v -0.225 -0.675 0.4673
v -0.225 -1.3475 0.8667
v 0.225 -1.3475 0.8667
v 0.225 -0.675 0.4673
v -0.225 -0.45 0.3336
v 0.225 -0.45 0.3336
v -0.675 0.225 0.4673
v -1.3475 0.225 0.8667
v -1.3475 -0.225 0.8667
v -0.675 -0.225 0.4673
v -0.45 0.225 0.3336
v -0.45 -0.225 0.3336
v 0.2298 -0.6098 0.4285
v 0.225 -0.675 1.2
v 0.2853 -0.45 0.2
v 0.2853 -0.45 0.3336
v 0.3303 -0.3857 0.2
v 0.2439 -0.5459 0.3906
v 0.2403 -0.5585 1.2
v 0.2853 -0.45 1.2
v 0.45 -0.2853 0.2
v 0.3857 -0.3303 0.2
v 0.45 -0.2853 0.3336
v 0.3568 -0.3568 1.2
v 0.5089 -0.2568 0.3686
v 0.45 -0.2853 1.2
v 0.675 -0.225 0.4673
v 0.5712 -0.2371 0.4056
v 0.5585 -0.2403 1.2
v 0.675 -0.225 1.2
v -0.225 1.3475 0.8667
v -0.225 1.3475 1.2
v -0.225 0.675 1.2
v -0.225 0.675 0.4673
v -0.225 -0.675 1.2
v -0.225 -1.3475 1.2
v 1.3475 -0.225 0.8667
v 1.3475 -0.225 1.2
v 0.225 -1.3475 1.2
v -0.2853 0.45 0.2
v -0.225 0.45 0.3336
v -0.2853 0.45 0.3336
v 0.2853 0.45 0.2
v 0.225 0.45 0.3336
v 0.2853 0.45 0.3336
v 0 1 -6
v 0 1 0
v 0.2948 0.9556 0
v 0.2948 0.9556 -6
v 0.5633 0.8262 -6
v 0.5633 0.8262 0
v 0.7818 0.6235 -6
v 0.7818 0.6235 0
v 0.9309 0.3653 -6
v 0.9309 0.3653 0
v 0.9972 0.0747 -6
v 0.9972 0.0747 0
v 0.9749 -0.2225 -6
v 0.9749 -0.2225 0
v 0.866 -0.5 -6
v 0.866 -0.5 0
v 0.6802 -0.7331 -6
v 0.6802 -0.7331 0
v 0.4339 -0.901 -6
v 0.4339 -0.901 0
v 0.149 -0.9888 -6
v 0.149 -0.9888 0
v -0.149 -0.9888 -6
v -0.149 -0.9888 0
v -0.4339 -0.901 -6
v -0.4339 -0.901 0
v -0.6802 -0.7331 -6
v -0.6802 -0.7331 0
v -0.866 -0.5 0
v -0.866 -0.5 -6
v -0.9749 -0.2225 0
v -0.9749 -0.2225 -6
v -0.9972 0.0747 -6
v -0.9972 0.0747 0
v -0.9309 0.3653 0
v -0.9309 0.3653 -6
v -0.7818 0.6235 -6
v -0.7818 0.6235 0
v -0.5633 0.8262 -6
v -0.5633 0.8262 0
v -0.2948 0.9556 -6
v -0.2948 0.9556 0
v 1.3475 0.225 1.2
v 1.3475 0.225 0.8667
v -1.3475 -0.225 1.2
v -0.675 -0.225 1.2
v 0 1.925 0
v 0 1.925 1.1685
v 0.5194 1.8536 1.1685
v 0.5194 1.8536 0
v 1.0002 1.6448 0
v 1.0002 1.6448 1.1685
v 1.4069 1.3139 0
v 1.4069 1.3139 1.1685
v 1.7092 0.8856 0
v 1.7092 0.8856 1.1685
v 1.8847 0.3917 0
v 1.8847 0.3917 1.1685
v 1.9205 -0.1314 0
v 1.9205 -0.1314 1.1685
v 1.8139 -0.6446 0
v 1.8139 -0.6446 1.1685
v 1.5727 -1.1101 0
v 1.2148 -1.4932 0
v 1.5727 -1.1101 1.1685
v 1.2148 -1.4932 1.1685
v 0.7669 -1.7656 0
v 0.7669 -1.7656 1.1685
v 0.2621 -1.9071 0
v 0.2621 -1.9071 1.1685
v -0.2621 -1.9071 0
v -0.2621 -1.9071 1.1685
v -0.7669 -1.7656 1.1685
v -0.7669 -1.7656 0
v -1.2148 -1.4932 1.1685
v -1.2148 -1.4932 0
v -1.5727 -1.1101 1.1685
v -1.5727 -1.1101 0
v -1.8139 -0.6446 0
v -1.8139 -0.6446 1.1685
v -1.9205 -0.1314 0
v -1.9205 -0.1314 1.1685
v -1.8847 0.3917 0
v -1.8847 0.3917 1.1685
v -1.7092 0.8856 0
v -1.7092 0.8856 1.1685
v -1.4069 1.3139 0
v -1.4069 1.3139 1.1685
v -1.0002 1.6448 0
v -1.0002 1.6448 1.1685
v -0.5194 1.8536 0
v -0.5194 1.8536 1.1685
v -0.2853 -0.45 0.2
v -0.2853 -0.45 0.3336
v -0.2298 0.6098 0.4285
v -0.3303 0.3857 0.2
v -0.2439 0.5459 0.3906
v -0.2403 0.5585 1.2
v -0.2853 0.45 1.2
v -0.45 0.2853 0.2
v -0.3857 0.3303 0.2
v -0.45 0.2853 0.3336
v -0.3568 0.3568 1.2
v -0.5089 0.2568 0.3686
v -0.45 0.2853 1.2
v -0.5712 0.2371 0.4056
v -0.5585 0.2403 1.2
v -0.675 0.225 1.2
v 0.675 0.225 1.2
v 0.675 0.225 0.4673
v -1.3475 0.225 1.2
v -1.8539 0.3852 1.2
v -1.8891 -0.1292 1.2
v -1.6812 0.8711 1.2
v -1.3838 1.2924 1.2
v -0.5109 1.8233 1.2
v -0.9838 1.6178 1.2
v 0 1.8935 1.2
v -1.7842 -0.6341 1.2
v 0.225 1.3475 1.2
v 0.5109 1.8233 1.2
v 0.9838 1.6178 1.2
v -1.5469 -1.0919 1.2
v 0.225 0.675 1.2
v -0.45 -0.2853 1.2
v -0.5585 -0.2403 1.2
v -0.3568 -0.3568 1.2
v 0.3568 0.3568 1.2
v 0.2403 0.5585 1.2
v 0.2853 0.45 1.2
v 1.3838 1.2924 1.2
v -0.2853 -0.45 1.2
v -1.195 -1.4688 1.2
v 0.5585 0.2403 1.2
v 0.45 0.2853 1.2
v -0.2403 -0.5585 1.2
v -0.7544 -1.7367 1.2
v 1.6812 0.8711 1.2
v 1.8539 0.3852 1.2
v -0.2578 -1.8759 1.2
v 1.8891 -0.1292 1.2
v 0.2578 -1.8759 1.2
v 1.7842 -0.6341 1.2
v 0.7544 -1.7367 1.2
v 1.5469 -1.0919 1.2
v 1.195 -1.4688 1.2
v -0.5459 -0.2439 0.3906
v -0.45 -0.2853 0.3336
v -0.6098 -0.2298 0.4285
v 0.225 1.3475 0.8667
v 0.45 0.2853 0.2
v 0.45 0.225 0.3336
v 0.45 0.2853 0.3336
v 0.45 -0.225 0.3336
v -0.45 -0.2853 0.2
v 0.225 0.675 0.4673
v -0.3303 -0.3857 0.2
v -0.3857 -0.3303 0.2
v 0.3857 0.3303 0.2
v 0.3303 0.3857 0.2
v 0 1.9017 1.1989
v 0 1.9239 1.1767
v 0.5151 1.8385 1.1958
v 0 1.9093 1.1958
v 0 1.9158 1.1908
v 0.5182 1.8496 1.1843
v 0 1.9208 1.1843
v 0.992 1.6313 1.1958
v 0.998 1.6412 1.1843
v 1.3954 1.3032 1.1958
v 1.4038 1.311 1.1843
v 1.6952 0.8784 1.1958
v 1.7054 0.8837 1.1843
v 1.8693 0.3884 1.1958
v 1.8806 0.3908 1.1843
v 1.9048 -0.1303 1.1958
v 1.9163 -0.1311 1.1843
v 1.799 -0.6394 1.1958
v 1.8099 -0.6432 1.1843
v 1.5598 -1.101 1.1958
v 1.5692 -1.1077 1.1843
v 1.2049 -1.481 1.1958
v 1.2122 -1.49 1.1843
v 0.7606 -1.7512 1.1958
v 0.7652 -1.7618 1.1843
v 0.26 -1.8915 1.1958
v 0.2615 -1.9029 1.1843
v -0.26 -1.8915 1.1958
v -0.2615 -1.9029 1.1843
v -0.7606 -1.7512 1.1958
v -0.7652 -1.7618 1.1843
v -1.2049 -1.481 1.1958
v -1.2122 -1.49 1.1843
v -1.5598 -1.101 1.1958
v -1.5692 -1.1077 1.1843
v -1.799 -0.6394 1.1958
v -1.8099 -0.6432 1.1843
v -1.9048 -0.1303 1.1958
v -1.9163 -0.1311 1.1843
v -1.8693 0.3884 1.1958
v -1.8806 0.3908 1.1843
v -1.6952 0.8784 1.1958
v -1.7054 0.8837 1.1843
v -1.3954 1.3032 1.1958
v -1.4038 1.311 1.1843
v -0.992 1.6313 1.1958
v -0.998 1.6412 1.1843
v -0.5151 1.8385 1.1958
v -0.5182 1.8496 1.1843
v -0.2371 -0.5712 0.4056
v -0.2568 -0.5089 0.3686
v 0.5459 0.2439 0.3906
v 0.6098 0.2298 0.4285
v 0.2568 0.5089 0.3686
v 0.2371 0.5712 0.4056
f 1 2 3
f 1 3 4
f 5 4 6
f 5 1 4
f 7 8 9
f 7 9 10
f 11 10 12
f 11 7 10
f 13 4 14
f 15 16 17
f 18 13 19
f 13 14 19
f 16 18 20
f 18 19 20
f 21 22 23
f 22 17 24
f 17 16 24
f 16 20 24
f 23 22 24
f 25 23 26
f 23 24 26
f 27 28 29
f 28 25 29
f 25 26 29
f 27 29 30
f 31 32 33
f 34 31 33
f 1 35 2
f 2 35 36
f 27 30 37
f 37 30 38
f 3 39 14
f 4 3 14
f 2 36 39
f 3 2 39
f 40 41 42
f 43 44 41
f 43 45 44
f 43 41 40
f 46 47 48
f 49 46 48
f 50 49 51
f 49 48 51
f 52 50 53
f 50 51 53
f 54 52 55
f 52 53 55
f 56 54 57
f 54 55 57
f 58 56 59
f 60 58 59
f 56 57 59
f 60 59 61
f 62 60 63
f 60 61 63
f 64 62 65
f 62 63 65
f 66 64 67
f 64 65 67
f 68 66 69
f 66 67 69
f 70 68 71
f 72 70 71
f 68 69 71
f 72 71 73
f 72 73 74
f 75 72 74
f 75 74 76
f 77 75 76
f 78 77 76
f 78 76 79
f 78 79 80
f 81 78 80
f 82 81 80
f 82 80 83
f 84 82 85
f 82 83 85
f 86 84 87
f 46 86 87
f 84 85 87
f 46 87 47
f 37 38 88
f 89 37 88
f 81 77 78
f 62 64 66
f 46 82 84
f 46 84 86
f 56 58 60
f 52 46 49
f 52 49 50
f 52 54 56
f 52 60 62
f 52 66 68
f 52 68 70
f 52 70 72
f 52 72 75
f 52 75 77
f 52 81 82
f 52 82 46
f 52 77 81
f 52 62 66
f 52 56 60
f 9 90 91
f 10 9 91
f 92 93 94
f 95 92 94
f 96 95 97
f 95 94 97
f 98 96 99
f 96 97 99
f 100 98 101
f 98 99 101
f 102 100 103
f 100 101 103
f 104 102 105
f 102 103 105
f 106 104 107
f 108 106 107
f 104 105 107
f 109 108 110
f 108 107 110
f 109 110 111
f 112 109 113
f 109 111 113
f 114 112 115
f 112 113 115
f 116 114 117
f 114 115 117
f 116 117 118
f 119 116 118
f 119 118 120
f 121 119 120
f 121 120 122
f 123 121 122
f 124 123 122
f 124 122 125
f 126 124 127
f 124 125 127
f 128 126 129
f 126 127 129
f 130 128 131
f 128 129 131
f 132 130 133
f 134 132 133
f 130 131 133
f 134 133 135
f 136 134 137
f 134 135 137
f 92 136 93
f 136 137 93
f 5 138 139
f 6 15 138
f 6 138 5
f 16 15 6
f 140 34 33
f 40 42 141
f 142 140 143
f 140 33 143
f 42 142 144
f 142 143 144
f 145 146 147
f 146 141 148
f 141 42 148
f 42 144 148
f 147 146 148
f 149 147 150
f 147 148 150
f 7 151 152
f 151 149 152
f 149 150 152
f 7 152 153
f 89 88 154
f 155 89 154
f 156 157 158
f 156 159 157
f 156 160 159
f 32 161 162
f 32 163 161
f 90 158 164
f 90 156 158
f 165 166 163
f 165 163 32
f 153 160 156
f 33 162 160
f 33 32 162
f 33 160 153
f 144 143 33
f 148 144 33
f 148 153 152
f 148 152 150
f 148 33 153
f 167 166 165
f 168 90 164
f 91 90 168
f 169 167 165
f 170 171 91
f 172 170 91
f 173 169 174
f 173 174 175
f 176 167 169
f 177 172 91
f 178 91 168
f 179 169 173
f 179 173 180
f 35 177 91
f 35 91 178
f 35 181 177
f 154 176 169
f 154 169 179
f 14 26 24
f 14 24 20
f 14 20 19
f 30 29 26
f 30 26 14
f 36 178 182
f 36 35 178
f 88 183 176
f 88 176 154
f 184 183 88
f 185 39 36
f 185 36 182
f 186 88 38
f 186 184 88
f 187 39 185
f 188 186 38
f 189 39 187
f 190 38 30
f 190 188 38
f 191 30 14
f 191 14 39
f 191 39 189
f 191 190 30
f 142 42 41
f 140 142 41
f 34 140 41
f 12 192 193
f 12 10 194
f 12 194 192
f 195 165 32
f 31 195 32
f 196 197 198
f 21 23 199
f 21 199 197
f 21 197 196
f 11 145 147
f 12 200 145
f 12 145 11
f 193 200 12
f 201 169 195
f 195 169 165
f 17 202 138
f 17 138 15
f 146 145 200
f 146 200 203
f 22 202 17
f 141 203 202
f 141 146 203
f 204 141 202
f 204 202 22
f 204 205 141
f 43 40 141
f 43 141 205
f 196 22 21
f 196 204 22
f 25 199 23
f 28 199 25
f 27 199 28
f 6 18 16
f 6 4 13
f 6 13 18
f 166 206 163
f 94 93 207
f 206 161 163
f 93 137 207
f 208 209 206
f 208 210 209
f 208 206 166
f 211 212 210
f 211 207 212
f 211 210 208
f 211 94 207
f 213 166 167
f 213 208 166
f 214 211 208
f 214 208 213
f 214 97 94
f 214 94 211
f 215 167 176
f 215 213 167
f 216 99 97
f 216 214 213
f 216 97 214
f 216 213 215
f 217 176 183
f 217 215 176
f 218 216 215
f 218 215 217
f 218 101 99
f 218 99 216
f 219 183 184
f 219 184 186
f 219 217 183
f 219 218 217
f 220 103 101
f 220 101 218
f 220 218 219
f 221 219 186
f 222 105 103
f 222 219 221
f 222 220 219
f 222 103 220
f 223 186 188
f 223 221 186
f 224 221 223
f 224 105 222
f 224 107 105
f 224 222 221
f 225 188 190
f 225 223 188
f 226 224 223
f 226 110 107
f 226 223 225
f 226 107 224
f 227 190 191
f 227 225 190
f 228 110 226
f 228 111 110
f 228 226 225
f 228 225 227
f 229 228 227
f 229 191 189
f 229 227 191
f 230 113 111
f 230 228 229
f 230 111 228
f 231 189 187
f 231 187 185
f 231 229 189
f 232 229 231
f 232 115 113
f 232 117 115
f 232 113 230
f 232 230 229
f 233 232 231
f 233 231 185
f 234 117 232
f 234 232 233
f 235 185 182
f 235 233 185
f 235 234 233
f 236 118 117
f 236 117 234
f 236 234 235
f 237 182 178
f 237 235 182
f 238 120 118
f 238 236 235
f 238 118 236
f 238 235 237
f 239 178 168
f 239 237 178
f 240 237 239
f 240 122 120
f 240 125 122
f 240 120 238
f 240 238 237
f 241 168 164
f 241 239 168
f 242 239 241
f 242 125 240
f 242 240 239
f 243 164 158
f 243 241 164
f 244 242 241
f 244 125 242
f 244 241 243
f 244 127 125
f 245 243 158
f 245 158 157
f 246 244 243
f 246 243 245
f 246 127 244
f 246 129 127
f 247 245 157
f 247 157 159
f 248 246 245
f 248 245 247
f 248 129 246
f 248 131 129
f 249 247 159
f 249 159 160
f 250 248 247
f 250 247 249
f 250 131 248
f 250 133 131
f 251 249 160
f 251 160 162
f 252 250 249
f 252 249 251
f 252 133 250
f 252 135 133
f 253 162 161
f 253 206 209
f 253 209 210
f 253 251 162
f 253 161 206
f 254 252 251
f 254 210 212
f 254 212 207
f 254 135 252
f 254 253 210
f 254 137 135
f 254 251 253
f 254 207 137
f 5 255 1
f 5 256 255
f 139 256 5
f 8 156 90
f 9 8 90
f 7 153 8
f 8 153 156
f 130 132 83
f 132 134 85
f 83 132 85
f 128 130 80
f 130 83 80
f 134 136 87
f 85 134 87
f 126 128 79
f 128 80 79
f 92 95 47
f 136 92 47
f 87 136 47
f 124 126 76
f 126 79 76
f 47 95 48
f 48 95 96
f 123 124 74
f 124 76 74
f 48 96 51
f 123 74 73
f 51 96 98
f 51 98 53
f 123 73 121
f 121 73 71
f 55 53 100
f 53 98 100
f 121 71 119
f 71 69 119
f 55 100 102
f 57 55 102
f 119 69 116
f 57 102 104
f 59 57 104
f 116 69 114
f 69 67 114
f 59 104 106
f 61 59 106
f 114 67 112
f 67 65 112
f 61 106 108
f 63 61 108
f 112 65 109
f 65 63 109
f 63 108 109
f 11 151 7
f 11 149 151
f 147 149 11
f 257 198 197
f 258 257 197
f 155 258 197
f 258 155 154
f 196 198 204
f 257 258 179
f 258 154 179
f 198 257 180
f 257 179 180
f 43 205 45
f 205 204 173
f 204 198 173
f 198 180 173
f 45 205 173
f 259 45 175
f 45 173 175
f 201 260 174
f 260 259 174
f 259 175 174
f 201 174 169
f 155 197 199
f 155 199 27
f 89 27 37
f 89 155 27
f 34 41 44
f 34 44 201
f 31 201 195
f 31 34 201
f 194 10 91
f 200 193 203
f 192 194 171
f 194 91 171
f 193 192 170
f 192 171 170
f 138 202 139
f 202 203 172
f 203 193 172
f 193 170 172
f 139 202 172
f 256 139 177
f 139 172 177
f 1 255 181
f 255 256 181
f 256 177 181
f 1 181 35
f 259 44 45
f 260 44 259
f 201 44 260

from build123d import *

# Parameters (mm, degrees)
SKETCH_1_W          = 1.925
SKETCH_1_H          = 1.2
CUT_EXTRUDE_1_DEPTH = 1
SKETCH_3_W          = 0.8975
SKETCH_3_H          = 0.13363029
EXTRUDE_1_DEPTH     = 0.45
SKETCH_4_W          = 0.13363029
SKETCH_4_H          = 0.8975
EXTRUDE_2_DEPTH     = 0.45
SKETCH_5_W          = 0.8975
SKETCH_5_H          = 0.13363029
EXTRUDE_3_DEPTH     = 0.45
SKETCH_6_W          = 0.13363029
SKETCH_6_H          = 0.8975
EXTRUDE_4_DEPTH     = 0.45
SKETCH_7_R          = 1
EXTRUDE_5_DEPTH     = 6
DRAFT_1_ANGLE       = 30.706601503
DRAFT_2_ANGLE       = 30.706601503
DRAFT_3_ANGLE       = 30.706601503
DRAFT_4_ANGLE       = 30.706601503
FILLET_1_R          = 0.031496063
FILLET_2_R          = 0.45


with BuildPart() as part:
    # 草图1 → 旋转1 (revolve)
    with BuildSketch(Plane.XZ, mode=Mode.PRIVATE) as revolve_1_sk:
        with Locations((0.9625, 0.6)):
            Rectangle(SKETCH_1_W, SKETCH_1_H)
    revolve(revolve_1_sk.sketch.rotate(Axis((0, 0, 1.2), (0, 0, -1)), 270), axis=Axis((0, 0, 1.2), (0, 0, -1)))

    # 草图2 → 切除-拉伸1 (cut)
    with BuildSketch(Plane.XY.offset(1.2)):
        Polygon((0.225, 1.3475), (-0.225, 1.3475), (-0.225, 0.225), (-1.3475, 0.225), (-1.3475, -0.225), (-0.225, -0.225), (-0.225, -1.3475), (0.225, -1.3475), (0.225, -0.225), (1.3475, -0.225), (1.3475, 0.225), (0.225, 0.225), align=None)
    extrude(amount=-CUT_EXTRUDE_1_DEPTH, mode=Mode.SUBTRACT)

    # 草图3 → 凸台-拉伸1 (add)
    with BuildSketch(Plane.XZ.offset(-0.225)):
        with Locations((-0.89875, 0.266815145)):
            Rectangle(SKETCH_3_W, SKETCH_3_H)
    extrude(amount=EXTRUDE_1_DEPTH)

    # 草图4 → 凸台-拉伸2 (add)
    with BuildSketch(Plane(origin=(-0.225, 0, 0), x_dir=(0, 0, -1), z_dir=(1, 0, 0))):
        with Locations((-0.266815145, 0.89875)):
            Rectangle(SKETCH_4_W, SKETCH_4_H)
    extrude(amount=EXTRUDE_2_DEPTH)

    # 草图5 → 凸台-拉伸3 (add)
    with BuildSketch(Plane.XZ.offset(-0.225)):
        with Locations((0.89875, 0.266815145)):
            Rectangle(SKETCH_5_W, SKETCH_5_H)
    extrude(amount=EXTRUDE_3_DEPTH)

    # 草图6 → 凸台-拉伸4 (add)
    with BuildSketch(Plane(origin=(-0.225, 0, 0), x_dir=(0, 0, -1), z_dir=(1, 0, 0))):
        with Locations((-0.266815145, -0.89875)):
            Rectangle(SKETCH_6_W, SKETCH_6_H)
    extrude(amount=EXTRUDE_4_DEPTH)

    # 草图7 → 凸台-拉伸5 (add)
    with BuildSketch(Plane(origin=(0, 0, 0), x_dir=(-1, 0, 0), z_dir=(0, 0, -1))):
        with Locations(Location((0, 0, 0), (0, 0, 90))):
            Circle(SKETCH_7_R)
    extrude(amount=EXTRUDE_5_DEPTH)

    # 拔模1
    draft_1_faces = [part.faces().sort_by_distance(p)[0] for p in [
        (0, 0.89875, 0.33363029),
    ]]
    draft(draft_1_faces, Plane(origin=(0.225, 0.45, 0.2), x_dir=(0, 0, -1), z_dir=(0, -1, 0)), DRAFT_1_ANGLE)

    # 拔模2
    draft_2_faces = [part.faces().sort_by_distance(p)[0] for p in [
        (0.89875, 0, 0.33363029),
    ]]
    draft(draft_2_faces, Plane(origin=(0.45, -0.225, 0.2), x_dir=(0, 0, -1), z_dir=(-1, 0, 0)), DRAFT_2_ANGLE)

    # 拔模3
    draft_3_faces = [part.faces().sort_by_distance(p)[0] for p in [
        (0, -0.89875, 0.33363029),
    ]]
    draft(draft_3_faces, Plane(origin=(0.225, -0.45, 0.33363029), x_dir=(0, 0, 1), z_dir=(0, 1, 0)), DRAFT_3_ANGLE)

    # 拔模4
    draft_4_faces = [part.faces().sort_by_distance(p)[0] for p in [
        (-0.89875, 0, 0.33363029),
    ]]
    draft(draft_4_faces, Plane(origin=(-0.45, -0.225, 0.33363029), x_dir=(0, 0, 1), z_dir=(1, 0, 0)), DRAFT_4_ANGLE)

    # 圆角1
    fillet_1_edges = [part.edges().sort_by_distance(p)[0] for p in [
        (0, -1.925, 1.2),
    ]]
    fillet(fillet_1_edges, radius=FILLET_1_R)

    # 圆角2
    # the kernel refuses this fillet: 0.45 mm, written as the material it takes off along each edge
    with BuildSketch(Plane(origin=(0.225, 0.225, 2.325), x_dir=(0, 1, 0), z_dir=(0, 0, -1))) as fillet_2_piece_1_section:
        with BuildLine():
            CenterArc((FILLET_2_R, FILLET_2_R), FILLET_2_R, 180, 90)
            Line((0, FILLET_2_R), (0, 0))
            Line((0, 0), (FILLET_2_R, 0))
        make_face()
    fillet_2_piece_1 = extrude(amount=3.25, mode=Mode.PRIVATE)
    fillet_2_piece_1 = split(fillet_2_piece_1, bisect_by=Plane(origin=(0.243098692, 0.68726219, 0.474543246), z_dir=(0, -0.5106419849565733, 0.8597934421706244)), keep=Keep.TOP, mode=Mode.PRIVATE)
    fillet_2_piece_1 = split(fillet_2_piece_1, bisect_by=Plane(origin=(0.45, 0.504131357, 0.782889786), z_dir=(-1, 0, 0)), keep=Keep.TOP, mode=Mode.PRIVATE)
    add(fillet_2_piece_1, mode=Mode.SUBTRACT)
    with BuildSketch(Plane(origin=(0.225, 0.225, 2.325), x_dir=(0, 1, 0), z_dir=(0, 0, -1))) as fillet_2_piece_2_section:
        with BuildLine():
            CenterArc((FILLET_2_R, FILLET_2_R), FILLET_2_R, 180, 90)
            Line((0, FILLET_2_R), (0, 0))
            Line((0, 0), (FILLET_2_R, 0))
        make_face()
    fillet_2_piece_2 = extrude(amount=3.25, mode=Mode.PRIVATE)
    fillet_2_piece_2 = split(fillet_2_piece_2, bisect_by=Plane(origin=(0.504131356, 0.45, 0.782889786), z_dir=(0, -1, 0)), keep=Keep.TOP, mode=Mode.PRIVATE)
    fillet_2_piece_2 = split(fillet_2_piece_2, bisect_by=Plane(origin=(0.68726219, 0.243098692, 0.474543246), z_dir=(-0.5106419849565748, 0, 0.8597934421706236)), keep=Keep.TOP, mode=Mode.PRIVATE)
    add(fillet_2_piece_2, mode=Mode.SUBTRACT)
    with BuildSketch(Plane(origin=(0.225, 0.225, 2.325), x_dir=(0, 1, 0), z_dir=(0, 0, -1))) as fillet_2_piece_3_section:
        with BuildLine():
            CenterArc((FILLET_2_R, FILLET_2_R), FILLET_2_R, 180, 90)
            Line((0, FILLET_2_R), (0, 0))
            Line((0, 0), (FILLET_2_R, 0))
        make_face()
    fillet_2_piece_3 = extrude(amount=2.125, mode=Mode.PRIVATE)
    fillet_2_piece_3 = split(fillet_2_piece_3, bisect_by=Plane(origin=(0.325721218, 0.45, 0.219864503), z_dir=(0, -1, 0)), keep=Keep.TOP, mode=Mode.PRIVATE)
    fillet_2_piece_3 = split(fillet_2_piece_3, bisect_by=Plane(origin=(0.45, 0.325721218, 0.219864503), z_dir=(-1, 0, 0)), keep=Keep.TOP, mode=Mode.PRIVATE)
    add(fillet_2_piece_3, mode=Mode.SUBTRACT)
    with BuildSketch(Plane(origin=(0.225, -0.225, 2.325), x_dir=(1, 0, 0), z_dir=(0, 0, -1))) as fillet_2_piece_4_section:
        with BuildLine():
            CenterArc((FILLET_2_R, FILLET_2_R), FILLET_2_R, 180, 90)
            Line((0, FILLET_2_R), (0, 0))
            Line((0, 0), (FILLET_2_R, 0))
        make_face()
    fillet_2_piece_4 = extrude(amount=3.25, mode=Mode.PRIVATE)
    fillet_2_piece_4 = split(fillet_2_piece_4, bisect_by=Plane(origin=(0.68726219, -0.243098692, 0.474543246), z_dir=(-0.5106419849565748, 0, 0.8597934421706236)), keep=Keep.TOP, mode=Mode.PRIVATE)
    fillet_2_piece_4 = split(fillet_2_piece_4, bisect_by=Plane(origin=(0.504131357, -0.45, 0.782889786), z_dir=(0, 1, 0)), keep=Keep.TOP, mode=Mode.PRIVATE)
    add(fillet_2_piece_4, mode=Mode.SUBTRACT)
    with BuildSketch(Plane(origin=(0.225, -0.225, 2.325), x_dir=(1, 0, 0), z_dir=(0, 0, -1))) as fillet_2_piece_5_section:
        with BuildLine():
            CenterArc((FILLET_2_R, FILLET_2_R), FILLET_2_R, 180, 90)
            Line((0, FILLET_2_R), (0, 0))
            Line((0, 0), (FILLET_2_R, 0))
        make_face()
    fillet_2_piece_5 = extrude(amount=3.25, mode=Mode.PRIVATE)
    fillet_2_piece_5 = split(fillet_2_piece_5, bisect_by=Plane(origin=(0.45, -0.504131356, 0.782889786), z_dir=(-1, 0, 0)), keep=Keep.TOP, mode=Mode.PRIVATE)
    fillet_2_piece_5 = split(fillet_2_piece_5, bisect_by=Plane(origin=(0.243098692, -0.68726219, 0.474543246), z_dir=(0, 0.5106419849565746, 0.8597934421706236)), keep=Keep.TOP, mode=Mode.PRIVATE)
    add(fillet_2_piece_5, mode=Mode.SUBTRACT)
    with BuildSketch(Plane(origin=(0.225, -0.225, 2.325), x_dir=(1, 0, 0), z_dir=(0, 0, -1))) as fillet_2_piece_6_section:
        with BuildLine():
            CenterArc((FILLET_2_R, FILLET_2_R), FILLET_2_R, 180, 90)
            Line((0, FILLET_2_R), (0, 0))
            Line((0, 0), (FILLET_2_R, 0))
        make_face()
    fillet_2_piece_6 = extrude(amount=2.125, mode=Mode.PRIVATE)
    fillet_2_piece_6 = split(fillet_2_piece_6, bisect_by=Plane(origin=(0.45, -0.325721218, 0.219864503), z_dir=(-1, 0, 0)), keep=Keep.TOP, mode=Mode.PRIVATE)
    fillet_2_piece_6 = split(fillet_2_piece_6, bisect_by=Plane(origin=(0.325721218, -0.45, 0.219864503), z_dir=(0, 1, 0)), keep=Keep.TOP, mode=Mode.PRIVATE)
    add(fillet_2_piece_6, mode=Mode.SUBTRACT)
    with BuildSketch(Plane(origin=(-0.225, 0.225, 2.325), x_dir=(-1, 0, 0), z_dir=(0, 0, -1))) as fillet_2_piece_7_section:
        with BuildLine():
            CenterArc((FILLET_2_R, FILLET_2_R), FILLET_2_R, 180, 90)
            Line((0, FILLET_2_R), (0, 0))
            Line((0, 0), (FILLET_2_R, 0))
        make_face()
    fillet_2_piece_7 = extrude(amount=3.25, mode=Mode.PRIVATE)
    fillet_2_piece_7 = split(fillet_2_piece_7, bisect_by=Plane(origin=(-0.504131357, 0.45, 0.782889786), z_dir=(0, -1, 0)), keep=Keep.TOP, mode=Mode.PRIVATE)
    fillet_2_piece_7 = split(fillet_2_piece_7, bisect_by=Plane(origin=(-0.68726219, 0.243098692, 0.474543246), z_dir=(0.5106419849565733, 0, 0.8597934421706244)), keep=Keep.TOP, mode=Mode.PRIVATE)
    add(fillet_2_piece_7, mode=Mode.SUBTRACT)
    with BuildSketch(Plane(origin=(-0.225, 0.225, 2.325), x_dir=(-1, 0, 0), z_dir=(0, 0, -1))) as fillet_2_piece_8_section:
        with BuildLine():
            CenterArc((FILLET_2_R, FILLET_2_R), FILLET_2_R, 180, 90)
            Line((0, FILLET_2_R), (0, 0))
            Line((0, 0), (FILLET_2_R, 0))
        make_face()
    fillet_2_piece_8 = extrude(amount=3.25, mode=Mode.PRIVATE)
    fillet_2_piece_8 = split(fillet_2_piece_8, bisect_by=Plane(origin=(-0.243098692, 0.68726219, 0.474543246), z_dir=(0, -0.5106419849565733, 0.8597934421706244)), keep=Keep.TOP, mode=Mode.PRIVATE)
    fillet_2_piece_8 = split(fillet_2_piece_8, bisect_by=Plane(origin=(-0.45, 0.504131356, 0.782889786), z_dir=(1, 0, 0)), keep=Keep.TOP, mode=Mode.PRIVATE)
    add(fillet_2_piece_8, mode=Mode.SUBTRACT)
    with BuildSketch(Plane(origin=(-0.225, 0.225, 2.325), x_dir=(-1, 0, 0), z_dir=(0, 0, -1))) as fillet_2_piece_9_section:
        with BuildLine():
            CenterArc((FILLET_2_R, FILLET_2_R), FILLET_2_R, 180, 90)
            Line((0, FILLET_2_R), (0, 0))
            Line((0, 0), (FILLET_2_R, 0))
        make_face()
    fillet_2_piece_9 = extrude(amount=2.125, mode=Mode.PRIVATE)
    fillet_2_piece_9 = split(fillet_2_piece_9, bisect_by=Plane(origin=(-0.325721218, 0.45, 0.219864503), z_dir=(0, -1, 0)), keep=Keep.TOP, mode=Mode.PRIVATE)
    fillet_2_piece_9 = split(fillet_2_piece_9, bisect_by=Plane(origin=(-0.45, 0.325721218, 0.219864503), z_dir=(1, 0, 0)), keep=Keep.TOP, mode=Mode.PRIVATE)
    add(fillet_2_piece_9, mode=Mode.SUBTRACT)
    with BuildSketch(Plane(origin=(-0.225, -0.225, 2.325), x_dir=(0, -1, 0), z_dir=(0, 0, -1))) as fillet_2_piece_10_section:
        with BuildLine():
            CenterArc((FILLET_2_R, FILLET_2_R), FILLET_2_R, 180, 90)
            Line((0, FILLET_2_R), (0, 0))
            Line((0, 0), (FILLET_2_R, 0))
        make_face()
    fillet_2_piece_10 = extrude(amount=3.25, mode=Mode.PRIVATE)
    fillet_2_piece_10 = split(fillet_2_piece_10, bisect_by=Plane(origin=(-0.243098692, -0.68726219, 0.474543246), z_dir=(0, 0.5106419849565746, 0.8597934421706236)), keep=Keep.TOP, mode=Mode.PRIVATE)
    fillet_2_piece_10 = split(fillet_2_piece_10, bisect_by=Plane(origin=(-0.45, -0.504131357, 0.782889786), z_dir=(1, 0, 0)), keep=Keep.TOP, mode=Mode.PRIVATE)
    add(fillet_2_piece_10, mode=Mode.SUBTRACT)
    with BuildSketch(Plane(origin=(-0.225, -0.225, 2.325), x_dir=(0, -1, 0), z_dir=(0, 0, -1))) as fillet_2_piece_11_section:
        with BuildLine():
            CenterArc((FILLET_2_R, FILLET_2_R), FILLET_2_R, 180, 90)
            Line((0, FILLET_2_R), (0, 0))
            Line((0, 0), (FILLET_2_R, 0))
        make_face()
    fillet_2_piece_11 = extrude(amount=3.25, mode=Mode.PRIVATE)
    fillet_2_piece_11 = split(fillet_2_piece_11, bisect_by=Plane(origin=(-0.504131356, -0.45, 0.782889786), z_dir=(0, 1, 0)), keep=Keep.TOP, mode=Mode.PRIVATE)
    fillet_2_piece_11 = split(fillet_2_piece_11, bisect_by=Plane(origin=(-0.68726219, -0.243098692, 0.474543246), z_dir=(0.5106419849565733, 0, 0.8597934421706244)), keep=Keep.TOP, mode=Mode.PRIVATE)
    add(fillet_2_piece_11, mode=Mode.SUBTRACT)
    with BuildSketch(Plane(origin=(-0.225, -0.225, 2.325), x_dir=(0, -1, 0), z_dir=(0, 0, -1))) as fillet_2_piece_12_section:
        with BuildLine():
            CenterArc((FILLET_2_R, FILLET_2_R), FILLET_2_R, 180, 90)
            Line((0, FILLET_2_R), (0, 0))
            Line((0, 0), (FILLET_2_R, 0))
        make_face()
    fillet_2_piece_12 = extrude(amount=2.125, mode=Mode.PRIVATE)
    fillet_2_piece_12 = split(fillet_2_piece_12, bisect_by=Plane(origin=(-0.325721218, -0.45, 0.219864503), z_dir=(0, 1, 0)), keep=Keep.TOP, mode=Mode.PRIVATE)
    fillet_2_piece_12 = split(fillet_2_piece_12, bisect_by=Plane(origin=(-0.45, -0.325721218, 0.219864503), z_dir=(1, 0, 0)), keep=Keep.TOP, mode=Mode.PRIVATE)
    add(fillet_2_piece_12, mode=Mode.SUBTRACT)


solid = part.part
